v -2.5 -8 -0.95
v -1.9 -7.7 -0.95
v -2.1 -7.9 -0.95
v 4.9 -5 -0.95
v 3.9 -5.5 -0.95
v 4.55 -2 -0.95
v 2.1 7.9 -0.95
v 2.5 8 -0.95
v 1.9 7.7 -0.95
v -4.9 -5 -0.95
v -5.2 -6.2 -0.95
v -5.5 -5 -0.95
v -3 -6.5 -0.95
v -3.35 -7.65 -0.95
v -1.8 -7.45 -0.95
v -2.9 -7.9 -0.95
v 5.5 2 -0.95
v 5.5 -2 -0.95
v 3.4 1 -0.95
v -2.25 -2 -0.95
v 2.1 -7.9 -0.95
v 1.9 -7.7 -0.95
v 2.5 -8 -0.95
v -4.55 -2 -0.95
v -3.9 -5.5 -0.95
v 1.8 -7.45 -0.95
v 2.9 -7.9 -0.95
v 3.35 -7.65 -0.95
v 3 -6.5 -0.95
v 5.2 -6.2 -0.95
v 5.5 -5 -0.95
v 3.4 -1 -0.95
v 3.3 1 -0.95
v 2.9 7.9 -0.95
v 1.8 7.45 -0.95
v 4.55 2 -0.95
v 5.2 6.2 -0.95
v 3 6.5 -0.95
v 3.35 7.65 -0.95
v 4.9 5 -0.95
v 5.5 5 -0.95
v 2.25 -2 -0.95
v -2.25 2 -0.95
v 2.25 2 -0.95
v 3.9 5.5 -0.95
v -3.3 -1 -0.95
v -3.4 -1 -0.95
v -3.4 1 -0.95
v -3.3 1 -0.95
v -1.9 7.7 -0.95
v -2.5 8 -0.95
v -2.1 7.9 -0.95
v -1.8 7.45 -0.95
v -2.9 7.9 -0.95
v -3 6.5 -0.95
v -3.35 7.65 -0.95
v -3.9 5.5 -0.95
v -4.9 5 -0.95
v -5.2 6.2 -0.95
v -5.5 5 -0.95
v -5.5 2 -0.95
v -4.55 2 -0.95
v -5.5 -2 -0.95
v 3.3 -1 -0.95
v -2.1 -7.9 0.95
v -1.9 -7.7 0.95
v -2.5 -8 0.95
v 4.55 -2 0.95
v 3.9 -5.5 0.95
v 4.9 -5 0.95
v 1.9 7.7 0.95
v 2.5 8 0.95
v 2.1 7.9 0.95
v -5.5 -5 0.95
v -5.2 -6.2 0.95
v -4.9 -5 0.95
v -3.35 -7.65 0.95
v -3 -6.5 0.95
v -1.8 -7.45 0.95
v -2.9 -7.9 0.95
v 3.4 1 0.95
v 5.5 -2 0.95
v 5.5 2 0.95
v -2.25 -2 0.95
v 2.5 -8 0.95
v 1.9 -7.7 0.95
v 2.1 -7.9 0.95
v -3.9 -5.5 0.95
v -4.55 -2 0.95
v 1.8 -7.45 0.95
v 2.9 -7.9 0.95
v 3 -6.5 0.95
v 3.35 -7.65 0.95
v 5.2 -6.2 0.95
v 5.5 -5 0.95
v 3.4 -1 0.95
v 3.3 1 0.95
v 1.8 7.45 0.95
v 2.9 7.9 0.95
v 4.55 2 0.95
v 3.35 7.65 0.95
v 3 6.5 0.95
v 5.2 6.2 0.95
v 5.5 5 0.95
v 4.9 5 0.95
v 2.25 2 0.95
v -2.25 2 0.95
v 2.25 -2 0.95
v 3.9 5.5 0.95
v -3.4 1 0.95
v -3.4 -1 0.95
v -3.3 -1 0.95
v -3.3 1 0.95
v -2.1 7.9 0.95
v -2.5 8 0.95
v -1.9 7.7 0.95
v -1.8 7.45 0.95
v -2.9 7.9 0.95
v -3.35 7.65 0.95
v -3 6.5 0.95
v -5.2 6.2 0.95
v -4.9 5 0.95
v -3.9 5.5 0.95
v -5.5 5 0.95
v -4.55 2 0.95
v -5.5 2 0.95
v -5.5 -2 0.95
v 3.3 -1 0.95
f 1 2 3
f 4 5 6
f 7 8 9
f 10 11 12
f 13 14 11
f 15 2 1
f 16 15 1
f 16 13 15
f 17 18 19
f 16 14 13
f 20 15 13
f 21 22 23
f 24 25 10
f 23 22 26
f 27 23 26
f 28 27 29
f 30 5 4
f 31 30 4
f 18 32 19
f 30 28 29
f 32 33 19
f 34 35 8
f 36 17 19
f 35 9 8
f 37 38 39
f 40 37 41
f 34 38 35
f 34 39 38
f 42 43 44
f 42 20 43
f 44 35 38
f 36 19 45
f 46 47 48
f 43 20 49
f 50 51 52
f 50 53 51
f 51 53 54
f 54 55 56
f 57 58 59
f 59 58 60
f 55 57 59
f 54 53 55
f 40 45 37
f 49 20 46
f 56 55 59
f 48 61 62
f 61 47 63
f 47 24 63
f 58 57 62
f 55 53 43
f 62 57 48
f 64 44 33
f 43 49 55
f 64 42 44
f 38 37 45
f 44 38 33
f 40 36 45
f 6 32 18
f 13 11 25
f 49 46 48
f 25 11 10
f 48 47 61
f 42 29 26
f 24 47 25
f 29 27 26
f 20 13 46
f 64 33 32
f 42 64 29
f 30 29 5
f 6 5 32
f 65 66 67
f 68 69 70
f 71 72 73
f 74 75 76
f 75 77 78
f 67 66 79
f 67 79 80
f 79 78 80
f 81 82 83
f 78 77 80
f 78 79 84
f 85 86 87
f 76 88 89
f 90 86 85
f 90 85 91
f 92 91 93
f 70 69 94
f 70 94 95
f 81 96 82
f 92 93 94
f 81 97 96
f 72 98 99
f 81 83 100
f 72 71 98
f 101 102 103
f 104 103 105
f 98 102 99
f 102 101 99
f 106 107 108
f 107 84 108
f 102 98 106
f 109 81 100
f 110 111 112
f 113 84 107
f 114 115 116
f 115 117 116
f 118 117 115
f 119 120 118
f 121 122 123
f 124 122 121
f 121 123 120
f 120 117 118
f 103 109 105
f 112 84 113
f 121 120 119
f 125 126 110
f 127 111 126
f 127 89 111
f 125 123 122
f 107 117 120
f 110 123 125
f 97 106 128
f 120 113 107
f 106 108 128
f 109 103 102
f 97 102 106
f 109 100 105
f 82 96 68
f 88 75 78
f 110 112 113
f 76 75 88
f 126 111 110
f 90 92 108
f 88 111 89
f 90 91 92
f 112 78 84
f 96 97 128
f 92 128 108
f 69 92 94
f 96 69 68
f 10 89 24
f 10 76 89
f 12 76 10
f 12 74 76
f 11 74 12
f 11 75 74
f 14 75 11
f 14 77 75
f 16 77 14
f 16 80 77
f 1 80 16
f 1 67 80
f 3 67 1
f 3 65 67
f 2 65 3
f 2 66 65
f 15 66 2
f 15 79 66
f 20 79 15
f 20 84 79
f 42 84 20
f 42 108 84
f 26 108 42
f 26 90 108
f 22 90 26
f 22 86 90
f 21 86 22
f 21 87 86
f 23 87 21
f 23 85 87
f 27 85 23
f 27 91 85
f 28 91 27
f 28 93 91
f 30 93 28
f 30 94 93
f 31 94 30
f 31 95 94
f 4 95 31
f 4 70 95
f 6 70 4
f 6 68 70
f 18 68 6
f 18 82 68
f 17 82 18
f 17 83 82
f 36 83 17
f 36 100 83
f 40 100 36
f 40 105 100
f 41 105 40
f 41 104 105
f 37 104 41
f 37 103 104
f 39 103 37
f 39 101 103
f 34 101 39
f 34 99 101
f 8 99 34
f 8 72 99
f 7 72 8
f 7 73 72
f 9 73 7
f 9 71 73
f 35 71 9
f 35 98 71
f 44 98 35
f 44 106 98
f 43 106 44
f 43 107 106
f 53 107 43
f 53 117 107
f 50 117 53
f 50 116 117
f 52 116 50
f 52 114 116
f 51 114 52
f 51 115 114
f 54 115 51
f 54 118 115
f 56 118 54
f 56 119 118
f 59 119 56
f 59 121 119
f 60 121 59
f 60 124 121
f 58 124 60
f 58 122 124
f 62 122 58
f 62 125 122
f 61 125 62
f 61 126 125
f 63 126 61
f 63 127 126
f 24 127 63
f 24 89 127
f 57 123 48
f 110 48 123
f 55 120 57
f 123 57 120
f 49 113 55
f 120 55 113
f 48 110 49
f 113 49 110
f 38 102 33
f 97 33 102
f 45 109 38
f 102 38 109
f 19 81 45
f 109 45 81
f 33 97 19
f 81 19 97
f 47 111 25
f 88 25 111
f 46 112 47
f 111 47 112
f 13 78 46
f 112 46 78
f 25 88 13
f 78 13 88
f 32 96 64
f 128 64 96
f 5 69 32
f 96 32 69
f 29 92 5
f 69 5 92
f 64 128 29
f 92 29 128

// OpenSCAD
// file: girl/girl_common.scad
// Copyright 2025 Natalie Baker // Apache v2 //

base_size  = 32;
wall_width =  9;

magnet_dia    = 6.2;
magnet_height = 2.8;

lock_height   = 1.9;
lock_depth    = 4.9;
lock_width    = 11;

lock_hole_dia = 2.25;

grid_size   = base_size + 2*wall_width;
grid_diag   = sqrt(2*grid_size*grid_size);
grid_height = max(lock_height, magnet_height)+1.2;

frame_size = 2.4;

module repeat(size, x, y, z, center) {
	off = center 
		? [(x-1)*size[0],(y-1)*size[1],(z-1)*size[2]]/2 
		: [0,0,0];

	for(i = [0 : x-1])
	for(j = [0 : y-1])
	for(k = [0 : z-1])
		translate([
			size[0]*i-off[0],
			size[1]*j-off[1],
			size[2]*k-off[2]
		]) children();
}
// file: girl/girl_lock.scad
// Copyright 2025 Natalie Baker // Apache v2 //

include<girl_common.scad>;

girl_lock();

//color("blue")
//translate([0,0,-1]) 
//girl_slot();

module girl_lock() {
	$fn=12;
	linear_extrude(lock_height, center=true)
	mirror_copy([0,1])
	mirror_copy([1,0])
	_girl_lock_part();
}

module girl_slot() {
	$fn=12;
	linear_extrude(lock_height+0.4, center=true)
	mirror_copy([0,1])
	mirror_copy([1,0])
	_girl_slot_part();
}

module _girl_slot_part() {
	polygon([
		[           0,      0.00],
		[lock_width/2+0.30, 0.00],
		[lock_width/2+0.30, 2.20],
		[lock_width/2-0.45, 2.20],
		[lock_width/2-0.75, 2.80],
		[lock_width/2-0.55, lock_depth],
		[lock_width/2+0.50, lock_depth],
		[lock_width/2+0.50, 8.25],
		[lock_width/2-5.00, 8.25],
		[lock_width/2-4.70, 2.75],
		[lock_width/2-5.00, 2.30],
		[           0,      2.30],
	]);
}

module _girl_lock_part() {
	difference() {
		polygon([
			[           0,      0.00],
			[lock_width/2,      0.00],
			[lock_width/2,      2.00],
			[lock_width/2-0.95, 2.00],
			[lock_width/2-0.60, lock_depth+0.1],
			[lock_width/2,      lock_depth+0.1],
			[lock_width/2-0.30, 6.20],
			[lock_width/2-2.15, 7.65],
			[lock_width/2-2.60, 7.90],
			[lock_width/2-3.00, 8.00],
			[lock_width/2-3.40, 7.90],
			[lock_width/2-3.60, 7.70],
			[lock_width/2-3.70, 7.45],
			[lock_width/2-3.25, 2.00],
			[           0,      2.00],
		]);
		polygon([
			[lock_width/2-2.10, 1.00],
			[lock_width/2-1.60, 5.50],
			[lock_width/2-2.50, 6.50],
			[lock_width/2-2.20, 1.00],
		]);
	}
}

module mirror_copy(m) {
	mirror(m) children();
	children();	
}
// main file
// Copyright 2025 Natalie Baker // Apache v2 //

use<girl/girl_lock.scad>;

girl_lock();
